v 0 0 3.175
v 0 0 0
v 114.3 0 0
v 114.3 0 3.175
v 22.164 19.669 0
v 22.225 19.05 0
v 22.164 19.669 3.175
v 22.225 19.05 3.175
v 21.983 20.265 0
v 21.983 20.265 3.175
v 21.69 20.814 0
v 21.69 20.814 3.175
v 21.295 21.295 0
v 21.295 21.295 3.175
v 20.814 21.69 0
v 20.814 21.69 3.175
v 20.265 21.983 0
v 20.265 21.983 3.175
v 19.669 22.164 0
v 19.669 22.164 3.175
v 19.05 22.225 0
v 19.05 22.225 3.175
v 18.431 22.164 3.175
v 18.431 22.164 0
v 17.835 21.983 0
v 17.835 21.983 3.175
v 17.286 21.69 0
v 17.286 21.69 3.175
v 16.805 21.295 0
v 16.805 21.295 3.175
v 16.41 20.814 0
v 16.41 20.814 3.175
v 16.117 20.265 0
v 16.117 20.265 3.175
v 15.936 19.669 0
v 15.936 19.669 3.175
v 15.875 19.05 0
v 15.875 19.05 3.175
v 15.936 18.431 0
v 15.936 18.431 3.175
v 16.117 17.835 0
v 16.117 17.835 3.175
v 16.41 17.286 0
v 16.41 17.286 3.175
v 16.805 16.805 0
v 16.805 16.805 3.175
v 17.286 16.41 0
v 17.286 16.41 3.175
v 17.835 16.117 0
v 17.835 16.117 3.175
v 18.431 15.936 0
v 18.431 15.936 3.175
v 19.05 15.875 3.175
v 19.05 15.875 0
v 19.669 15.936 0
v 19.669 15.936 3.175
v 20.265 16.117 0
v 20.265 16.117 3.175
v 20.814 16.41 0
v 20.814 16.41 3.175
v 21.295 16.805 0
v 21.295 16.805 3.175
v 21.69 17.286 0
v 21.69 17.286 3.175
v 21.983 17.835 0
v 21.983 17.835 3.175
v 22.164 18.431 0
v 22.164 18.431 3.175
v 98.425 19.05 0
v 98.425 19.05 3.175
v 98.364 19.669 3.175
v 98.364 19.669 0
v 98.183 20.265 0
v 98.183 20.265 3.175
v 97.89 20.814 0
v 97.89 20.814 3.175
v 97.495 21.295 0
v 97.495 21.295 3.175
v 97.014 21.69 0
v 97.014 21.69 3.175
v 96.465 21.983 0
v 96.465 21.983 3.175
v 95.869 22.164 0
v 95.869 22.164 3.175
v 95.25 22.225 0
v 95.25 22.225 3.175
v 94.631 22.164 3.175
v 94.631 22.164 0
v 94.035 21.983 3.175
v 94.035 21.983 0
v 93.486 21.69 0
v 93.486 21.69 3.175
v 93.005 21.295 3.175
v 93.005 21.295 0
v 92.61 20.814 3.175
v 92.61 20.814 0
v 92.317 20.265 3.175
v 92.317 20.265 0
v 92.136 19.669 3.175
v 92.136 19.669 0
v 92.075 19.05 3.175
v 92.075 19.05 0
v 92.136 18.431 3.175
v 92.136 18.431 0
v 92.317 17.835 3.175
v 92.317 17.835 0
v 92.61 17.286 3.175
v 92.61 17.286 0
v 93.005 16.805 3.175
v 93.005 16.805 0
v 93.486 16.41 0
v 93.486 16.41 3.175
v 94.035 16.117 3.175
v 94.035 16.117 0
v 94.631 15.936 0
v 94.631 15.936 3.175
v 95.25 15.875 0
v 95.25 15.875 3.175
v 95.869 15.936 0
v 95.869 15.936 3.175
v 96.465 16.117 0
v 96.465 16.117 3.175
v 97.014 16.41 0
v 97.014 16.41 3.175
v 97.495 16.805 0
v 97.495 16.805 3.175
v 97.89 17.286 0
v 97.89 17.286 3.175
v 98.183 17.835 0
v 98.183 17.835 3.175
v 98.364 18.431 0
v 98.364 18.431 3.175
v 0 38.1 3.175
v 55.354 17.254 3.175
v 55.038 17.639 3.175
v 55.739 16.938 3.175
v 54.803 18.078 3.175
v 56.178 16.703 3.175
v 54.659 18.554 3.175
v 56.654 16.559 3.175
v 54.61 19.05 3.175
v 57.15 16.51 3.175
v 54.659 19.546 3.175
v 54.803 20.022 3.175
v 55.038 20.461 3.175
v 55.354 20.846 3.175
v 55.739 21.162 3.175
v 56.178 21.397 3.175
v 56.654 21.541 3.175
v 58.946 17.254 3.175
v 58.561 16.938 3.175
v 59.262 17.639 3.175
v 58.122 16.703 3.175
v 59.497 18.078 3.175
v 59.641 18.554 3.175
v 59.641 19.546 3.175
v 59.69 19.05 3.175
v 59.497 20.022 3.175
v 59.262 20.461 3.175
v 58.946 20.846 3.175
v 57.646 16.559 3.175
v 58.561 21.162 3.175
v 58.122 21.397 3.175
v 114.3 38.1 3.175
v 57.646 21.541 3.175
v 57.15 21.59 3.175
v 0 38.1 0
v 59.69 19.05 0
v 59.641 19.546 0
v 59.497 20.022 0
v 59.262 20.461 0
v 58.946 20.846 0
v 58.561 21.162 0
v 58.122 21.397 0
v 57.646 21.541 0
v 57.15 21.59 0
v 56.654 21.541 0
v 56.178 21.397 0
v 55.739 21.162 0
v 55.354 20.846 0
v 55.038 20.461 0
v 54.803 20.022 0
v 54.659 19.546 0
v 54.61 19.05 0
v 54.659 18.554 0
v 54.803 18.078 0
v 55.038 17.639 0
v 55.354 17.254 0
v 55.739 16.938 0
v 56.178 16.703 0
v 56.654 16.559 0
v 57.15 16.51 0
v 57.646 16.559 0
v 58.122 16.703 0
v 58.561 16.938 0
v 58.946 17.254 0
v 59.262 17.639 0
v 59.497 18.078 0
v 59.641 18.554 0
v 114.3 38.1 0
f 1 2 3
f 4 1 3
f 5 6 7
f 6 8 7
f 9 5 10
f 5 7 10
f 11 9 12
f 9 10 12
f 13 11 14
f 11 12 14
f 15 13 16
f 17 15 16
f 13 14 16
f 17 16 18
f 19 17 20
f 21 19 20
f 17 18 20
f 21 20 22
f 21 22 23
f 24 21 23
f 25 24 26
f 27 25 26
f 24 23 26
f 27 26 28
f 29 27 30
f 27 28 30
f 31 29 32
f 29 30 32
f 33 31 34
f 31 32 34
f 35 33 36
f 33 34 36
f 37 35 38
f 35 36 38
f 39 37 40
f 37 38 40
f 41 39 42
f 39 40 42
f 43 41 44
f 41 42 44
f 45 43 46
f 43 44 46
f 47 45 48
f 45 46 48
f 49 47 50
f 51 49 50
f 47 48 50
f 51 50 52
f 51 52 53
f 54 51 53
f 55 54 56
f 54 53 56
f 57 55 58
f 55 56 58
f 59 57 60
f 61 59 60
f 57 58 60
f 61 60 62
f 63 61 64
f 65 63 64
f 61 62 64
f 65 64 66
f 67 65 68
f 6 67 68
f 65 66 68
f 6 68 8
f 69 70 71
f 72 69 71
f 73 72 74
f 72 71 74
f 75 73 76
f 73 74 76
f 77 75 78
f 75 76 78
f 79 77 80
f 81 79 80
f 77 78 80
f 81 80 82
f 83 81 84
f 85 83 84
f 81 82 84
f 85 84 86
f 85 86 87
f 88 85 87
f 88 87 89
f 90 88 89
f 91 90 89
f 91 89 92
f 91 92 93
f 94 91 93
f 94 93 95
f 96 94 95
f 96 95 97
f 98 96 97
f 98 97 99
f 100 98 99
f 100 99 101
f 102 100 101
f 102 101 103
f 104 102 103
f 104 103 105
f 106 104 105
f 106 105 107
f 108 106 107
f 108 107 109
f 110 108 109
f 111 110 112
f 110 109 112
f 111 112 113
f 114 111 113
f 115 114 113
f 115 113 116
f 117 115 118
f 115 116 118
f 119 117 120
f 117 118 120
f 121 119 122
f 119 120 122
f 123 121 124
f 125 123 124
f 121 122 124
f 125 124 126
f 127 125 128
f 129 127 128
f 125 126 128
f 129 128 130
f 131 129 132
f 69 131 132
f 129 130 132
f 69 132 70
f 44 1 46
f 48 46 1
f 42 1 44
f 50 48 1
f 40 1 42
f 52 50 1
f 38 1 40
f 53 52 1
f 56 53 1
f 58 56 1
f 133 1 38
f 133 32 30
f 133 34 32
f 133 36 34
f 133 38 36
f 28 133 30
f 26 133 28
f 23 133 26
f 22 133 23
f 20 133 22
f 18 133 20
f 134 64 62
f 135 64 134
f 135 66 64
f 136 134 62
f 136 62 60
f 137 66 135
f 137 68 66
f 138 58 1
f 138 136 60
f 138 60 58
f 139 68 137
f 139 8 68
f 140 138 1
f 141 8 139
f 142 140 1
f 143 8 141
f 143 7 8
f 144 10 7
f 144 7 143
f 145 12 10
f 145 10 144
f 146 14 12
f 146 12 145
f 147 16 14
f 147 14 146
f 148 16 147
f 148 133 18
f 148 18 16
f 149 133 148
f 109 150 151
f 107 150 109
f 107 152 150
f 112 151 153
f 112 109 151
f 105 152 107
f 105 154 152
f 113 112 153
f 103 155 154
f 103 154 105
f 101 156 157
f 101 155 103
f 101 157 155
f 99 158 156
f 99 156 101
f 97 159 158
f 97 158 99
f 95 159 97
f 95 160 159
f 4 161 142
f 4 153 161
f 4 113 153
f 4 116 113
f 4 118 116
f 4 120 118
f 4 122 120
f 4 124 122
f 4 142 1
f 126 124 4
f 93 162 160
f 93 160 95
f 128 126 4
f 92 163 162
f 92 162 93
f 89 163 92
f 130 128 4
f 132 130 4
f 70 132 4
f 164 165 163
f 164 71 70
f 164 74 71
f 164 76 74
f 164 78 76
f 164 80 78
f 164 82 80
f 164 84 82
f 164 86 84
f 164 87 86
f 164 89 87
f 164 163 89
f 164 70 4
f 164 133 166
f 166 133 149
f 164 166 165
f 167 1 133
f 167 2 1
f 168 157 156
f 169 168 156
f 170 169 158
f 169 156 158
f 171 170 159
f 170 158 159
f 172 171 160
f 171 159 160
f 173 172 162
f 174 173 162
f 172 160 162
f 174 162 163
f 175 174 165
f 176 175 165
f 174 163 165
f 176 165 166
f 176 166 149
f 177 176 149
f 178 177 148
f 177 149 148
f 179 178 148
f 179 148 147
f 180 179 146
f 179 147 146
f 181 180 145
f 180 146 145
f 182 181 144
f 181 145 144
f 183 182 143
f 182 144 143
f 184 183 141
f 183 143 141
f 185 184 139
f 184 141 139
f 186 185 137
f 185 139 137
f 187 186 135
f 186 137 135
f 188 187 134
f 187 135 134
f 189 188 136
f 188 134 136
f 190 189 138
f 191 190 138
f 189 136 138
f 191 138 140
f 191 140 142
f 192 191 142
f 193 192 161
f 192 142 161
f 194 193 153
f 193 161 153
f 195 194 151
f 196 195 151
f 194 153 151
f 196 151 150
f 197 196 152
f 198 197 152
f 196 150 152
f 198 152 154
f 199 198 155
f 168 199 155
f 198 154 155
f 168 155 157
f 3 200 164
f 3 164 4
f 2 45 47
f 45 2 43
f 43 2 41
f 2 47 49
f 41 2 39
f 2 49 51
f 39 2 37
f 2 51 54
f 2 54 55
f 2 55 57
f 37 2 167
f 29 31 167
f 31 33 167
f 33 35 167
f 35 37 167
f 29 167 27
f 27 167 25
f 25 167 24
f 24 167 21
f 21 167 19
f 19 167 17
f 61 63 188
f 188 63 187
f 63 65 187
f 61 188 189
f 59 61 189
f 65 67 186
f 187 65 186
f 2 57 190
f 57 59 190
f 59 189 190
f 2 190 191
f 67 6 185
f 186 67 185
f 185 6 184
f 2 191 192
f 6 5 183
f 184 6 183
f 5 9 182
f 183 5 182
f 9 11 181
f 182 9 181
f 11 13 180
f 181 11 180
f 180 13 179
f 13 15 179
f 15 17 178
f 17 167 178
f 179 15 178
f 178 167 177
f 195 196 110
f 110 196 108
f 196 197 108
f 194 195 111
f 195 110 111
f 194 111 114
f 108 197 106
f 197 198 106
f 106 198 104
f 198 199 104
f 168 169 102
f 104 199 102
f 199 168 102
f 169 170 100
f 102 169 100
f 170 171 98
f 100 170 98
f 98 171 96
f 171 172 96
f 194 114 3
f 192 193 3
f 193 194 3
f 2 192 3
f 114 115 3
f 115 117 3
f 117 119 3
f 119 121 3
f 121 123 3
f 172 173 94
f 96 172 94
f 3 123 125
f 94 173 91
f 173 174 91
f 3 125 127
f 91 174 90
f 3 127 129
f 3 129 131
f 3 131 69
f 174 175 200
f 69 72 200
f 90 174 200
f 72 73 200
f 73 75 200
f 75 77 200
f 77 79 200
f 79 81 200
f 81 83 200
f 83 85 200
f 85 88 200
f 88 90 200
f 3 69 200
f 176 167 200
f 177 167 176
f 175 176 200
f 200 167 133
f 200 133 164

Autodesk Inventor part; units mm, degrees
ref_plane "YZ Plane" through (0, 0, 0) normal (1, 0, 0) x (0, 1, 0)
ref_plane "XZ Plane" through (0, 0, 0) normal (0, 1, 0) x (-1, 0, 0)
ref_plane "XY Plane" through (0, 0, 0) normal (0, 0, 1) x (1, 0, 0)
sketch "Sketch1" plane through (0, 0, 0) normal (0, 0, 1) x (1, 0, 0)
  line L0 (0, 0) -> (0, 38.1)
  line L1 (0, 38.1) -> (114.3, 38.1)
  line L2 (114.3, 38.1) -> (114.3, 0)
  line L3 (0, 0) -> (114.3, 0)
  dimension "d0" = 38.1
  dimension "d1" = 114.3
extrude "Extrusion1" add sketch "Sketch1" along normal blind 3.175
sketch "Sketch2" plane through (0, 0, 3.175) normal (0, 0, 1) x (1, 0, 0)
  line L0 (114.3, 0) -> (114.3, 38.1) projected
  line L1 (114.3, 38.1) -> (0, 38.1) projected
  circle A0 centre (57.15, 19.05) radius 2.54
  line L2 (0, 38.1) -> (0, 0) projected
  circle A1 centre (19.05, 19.05) radius 3.175
  circle A2 centre (95.25, 19.05) radius 3.175
  dimension "d4" = 5.08
  dimension "d5" = 19.05
  dimension "d6" = 57.15
  dimension "d9" = 6.35
  dimension "d10" = 6.35
  dimension "d11" = 19.05
  dimension "d12" = 19.05
extrude "Extrusion3" cut sketch "Sketch2" against normal blind 25.4
properties part number "PistonPlate_v1"
